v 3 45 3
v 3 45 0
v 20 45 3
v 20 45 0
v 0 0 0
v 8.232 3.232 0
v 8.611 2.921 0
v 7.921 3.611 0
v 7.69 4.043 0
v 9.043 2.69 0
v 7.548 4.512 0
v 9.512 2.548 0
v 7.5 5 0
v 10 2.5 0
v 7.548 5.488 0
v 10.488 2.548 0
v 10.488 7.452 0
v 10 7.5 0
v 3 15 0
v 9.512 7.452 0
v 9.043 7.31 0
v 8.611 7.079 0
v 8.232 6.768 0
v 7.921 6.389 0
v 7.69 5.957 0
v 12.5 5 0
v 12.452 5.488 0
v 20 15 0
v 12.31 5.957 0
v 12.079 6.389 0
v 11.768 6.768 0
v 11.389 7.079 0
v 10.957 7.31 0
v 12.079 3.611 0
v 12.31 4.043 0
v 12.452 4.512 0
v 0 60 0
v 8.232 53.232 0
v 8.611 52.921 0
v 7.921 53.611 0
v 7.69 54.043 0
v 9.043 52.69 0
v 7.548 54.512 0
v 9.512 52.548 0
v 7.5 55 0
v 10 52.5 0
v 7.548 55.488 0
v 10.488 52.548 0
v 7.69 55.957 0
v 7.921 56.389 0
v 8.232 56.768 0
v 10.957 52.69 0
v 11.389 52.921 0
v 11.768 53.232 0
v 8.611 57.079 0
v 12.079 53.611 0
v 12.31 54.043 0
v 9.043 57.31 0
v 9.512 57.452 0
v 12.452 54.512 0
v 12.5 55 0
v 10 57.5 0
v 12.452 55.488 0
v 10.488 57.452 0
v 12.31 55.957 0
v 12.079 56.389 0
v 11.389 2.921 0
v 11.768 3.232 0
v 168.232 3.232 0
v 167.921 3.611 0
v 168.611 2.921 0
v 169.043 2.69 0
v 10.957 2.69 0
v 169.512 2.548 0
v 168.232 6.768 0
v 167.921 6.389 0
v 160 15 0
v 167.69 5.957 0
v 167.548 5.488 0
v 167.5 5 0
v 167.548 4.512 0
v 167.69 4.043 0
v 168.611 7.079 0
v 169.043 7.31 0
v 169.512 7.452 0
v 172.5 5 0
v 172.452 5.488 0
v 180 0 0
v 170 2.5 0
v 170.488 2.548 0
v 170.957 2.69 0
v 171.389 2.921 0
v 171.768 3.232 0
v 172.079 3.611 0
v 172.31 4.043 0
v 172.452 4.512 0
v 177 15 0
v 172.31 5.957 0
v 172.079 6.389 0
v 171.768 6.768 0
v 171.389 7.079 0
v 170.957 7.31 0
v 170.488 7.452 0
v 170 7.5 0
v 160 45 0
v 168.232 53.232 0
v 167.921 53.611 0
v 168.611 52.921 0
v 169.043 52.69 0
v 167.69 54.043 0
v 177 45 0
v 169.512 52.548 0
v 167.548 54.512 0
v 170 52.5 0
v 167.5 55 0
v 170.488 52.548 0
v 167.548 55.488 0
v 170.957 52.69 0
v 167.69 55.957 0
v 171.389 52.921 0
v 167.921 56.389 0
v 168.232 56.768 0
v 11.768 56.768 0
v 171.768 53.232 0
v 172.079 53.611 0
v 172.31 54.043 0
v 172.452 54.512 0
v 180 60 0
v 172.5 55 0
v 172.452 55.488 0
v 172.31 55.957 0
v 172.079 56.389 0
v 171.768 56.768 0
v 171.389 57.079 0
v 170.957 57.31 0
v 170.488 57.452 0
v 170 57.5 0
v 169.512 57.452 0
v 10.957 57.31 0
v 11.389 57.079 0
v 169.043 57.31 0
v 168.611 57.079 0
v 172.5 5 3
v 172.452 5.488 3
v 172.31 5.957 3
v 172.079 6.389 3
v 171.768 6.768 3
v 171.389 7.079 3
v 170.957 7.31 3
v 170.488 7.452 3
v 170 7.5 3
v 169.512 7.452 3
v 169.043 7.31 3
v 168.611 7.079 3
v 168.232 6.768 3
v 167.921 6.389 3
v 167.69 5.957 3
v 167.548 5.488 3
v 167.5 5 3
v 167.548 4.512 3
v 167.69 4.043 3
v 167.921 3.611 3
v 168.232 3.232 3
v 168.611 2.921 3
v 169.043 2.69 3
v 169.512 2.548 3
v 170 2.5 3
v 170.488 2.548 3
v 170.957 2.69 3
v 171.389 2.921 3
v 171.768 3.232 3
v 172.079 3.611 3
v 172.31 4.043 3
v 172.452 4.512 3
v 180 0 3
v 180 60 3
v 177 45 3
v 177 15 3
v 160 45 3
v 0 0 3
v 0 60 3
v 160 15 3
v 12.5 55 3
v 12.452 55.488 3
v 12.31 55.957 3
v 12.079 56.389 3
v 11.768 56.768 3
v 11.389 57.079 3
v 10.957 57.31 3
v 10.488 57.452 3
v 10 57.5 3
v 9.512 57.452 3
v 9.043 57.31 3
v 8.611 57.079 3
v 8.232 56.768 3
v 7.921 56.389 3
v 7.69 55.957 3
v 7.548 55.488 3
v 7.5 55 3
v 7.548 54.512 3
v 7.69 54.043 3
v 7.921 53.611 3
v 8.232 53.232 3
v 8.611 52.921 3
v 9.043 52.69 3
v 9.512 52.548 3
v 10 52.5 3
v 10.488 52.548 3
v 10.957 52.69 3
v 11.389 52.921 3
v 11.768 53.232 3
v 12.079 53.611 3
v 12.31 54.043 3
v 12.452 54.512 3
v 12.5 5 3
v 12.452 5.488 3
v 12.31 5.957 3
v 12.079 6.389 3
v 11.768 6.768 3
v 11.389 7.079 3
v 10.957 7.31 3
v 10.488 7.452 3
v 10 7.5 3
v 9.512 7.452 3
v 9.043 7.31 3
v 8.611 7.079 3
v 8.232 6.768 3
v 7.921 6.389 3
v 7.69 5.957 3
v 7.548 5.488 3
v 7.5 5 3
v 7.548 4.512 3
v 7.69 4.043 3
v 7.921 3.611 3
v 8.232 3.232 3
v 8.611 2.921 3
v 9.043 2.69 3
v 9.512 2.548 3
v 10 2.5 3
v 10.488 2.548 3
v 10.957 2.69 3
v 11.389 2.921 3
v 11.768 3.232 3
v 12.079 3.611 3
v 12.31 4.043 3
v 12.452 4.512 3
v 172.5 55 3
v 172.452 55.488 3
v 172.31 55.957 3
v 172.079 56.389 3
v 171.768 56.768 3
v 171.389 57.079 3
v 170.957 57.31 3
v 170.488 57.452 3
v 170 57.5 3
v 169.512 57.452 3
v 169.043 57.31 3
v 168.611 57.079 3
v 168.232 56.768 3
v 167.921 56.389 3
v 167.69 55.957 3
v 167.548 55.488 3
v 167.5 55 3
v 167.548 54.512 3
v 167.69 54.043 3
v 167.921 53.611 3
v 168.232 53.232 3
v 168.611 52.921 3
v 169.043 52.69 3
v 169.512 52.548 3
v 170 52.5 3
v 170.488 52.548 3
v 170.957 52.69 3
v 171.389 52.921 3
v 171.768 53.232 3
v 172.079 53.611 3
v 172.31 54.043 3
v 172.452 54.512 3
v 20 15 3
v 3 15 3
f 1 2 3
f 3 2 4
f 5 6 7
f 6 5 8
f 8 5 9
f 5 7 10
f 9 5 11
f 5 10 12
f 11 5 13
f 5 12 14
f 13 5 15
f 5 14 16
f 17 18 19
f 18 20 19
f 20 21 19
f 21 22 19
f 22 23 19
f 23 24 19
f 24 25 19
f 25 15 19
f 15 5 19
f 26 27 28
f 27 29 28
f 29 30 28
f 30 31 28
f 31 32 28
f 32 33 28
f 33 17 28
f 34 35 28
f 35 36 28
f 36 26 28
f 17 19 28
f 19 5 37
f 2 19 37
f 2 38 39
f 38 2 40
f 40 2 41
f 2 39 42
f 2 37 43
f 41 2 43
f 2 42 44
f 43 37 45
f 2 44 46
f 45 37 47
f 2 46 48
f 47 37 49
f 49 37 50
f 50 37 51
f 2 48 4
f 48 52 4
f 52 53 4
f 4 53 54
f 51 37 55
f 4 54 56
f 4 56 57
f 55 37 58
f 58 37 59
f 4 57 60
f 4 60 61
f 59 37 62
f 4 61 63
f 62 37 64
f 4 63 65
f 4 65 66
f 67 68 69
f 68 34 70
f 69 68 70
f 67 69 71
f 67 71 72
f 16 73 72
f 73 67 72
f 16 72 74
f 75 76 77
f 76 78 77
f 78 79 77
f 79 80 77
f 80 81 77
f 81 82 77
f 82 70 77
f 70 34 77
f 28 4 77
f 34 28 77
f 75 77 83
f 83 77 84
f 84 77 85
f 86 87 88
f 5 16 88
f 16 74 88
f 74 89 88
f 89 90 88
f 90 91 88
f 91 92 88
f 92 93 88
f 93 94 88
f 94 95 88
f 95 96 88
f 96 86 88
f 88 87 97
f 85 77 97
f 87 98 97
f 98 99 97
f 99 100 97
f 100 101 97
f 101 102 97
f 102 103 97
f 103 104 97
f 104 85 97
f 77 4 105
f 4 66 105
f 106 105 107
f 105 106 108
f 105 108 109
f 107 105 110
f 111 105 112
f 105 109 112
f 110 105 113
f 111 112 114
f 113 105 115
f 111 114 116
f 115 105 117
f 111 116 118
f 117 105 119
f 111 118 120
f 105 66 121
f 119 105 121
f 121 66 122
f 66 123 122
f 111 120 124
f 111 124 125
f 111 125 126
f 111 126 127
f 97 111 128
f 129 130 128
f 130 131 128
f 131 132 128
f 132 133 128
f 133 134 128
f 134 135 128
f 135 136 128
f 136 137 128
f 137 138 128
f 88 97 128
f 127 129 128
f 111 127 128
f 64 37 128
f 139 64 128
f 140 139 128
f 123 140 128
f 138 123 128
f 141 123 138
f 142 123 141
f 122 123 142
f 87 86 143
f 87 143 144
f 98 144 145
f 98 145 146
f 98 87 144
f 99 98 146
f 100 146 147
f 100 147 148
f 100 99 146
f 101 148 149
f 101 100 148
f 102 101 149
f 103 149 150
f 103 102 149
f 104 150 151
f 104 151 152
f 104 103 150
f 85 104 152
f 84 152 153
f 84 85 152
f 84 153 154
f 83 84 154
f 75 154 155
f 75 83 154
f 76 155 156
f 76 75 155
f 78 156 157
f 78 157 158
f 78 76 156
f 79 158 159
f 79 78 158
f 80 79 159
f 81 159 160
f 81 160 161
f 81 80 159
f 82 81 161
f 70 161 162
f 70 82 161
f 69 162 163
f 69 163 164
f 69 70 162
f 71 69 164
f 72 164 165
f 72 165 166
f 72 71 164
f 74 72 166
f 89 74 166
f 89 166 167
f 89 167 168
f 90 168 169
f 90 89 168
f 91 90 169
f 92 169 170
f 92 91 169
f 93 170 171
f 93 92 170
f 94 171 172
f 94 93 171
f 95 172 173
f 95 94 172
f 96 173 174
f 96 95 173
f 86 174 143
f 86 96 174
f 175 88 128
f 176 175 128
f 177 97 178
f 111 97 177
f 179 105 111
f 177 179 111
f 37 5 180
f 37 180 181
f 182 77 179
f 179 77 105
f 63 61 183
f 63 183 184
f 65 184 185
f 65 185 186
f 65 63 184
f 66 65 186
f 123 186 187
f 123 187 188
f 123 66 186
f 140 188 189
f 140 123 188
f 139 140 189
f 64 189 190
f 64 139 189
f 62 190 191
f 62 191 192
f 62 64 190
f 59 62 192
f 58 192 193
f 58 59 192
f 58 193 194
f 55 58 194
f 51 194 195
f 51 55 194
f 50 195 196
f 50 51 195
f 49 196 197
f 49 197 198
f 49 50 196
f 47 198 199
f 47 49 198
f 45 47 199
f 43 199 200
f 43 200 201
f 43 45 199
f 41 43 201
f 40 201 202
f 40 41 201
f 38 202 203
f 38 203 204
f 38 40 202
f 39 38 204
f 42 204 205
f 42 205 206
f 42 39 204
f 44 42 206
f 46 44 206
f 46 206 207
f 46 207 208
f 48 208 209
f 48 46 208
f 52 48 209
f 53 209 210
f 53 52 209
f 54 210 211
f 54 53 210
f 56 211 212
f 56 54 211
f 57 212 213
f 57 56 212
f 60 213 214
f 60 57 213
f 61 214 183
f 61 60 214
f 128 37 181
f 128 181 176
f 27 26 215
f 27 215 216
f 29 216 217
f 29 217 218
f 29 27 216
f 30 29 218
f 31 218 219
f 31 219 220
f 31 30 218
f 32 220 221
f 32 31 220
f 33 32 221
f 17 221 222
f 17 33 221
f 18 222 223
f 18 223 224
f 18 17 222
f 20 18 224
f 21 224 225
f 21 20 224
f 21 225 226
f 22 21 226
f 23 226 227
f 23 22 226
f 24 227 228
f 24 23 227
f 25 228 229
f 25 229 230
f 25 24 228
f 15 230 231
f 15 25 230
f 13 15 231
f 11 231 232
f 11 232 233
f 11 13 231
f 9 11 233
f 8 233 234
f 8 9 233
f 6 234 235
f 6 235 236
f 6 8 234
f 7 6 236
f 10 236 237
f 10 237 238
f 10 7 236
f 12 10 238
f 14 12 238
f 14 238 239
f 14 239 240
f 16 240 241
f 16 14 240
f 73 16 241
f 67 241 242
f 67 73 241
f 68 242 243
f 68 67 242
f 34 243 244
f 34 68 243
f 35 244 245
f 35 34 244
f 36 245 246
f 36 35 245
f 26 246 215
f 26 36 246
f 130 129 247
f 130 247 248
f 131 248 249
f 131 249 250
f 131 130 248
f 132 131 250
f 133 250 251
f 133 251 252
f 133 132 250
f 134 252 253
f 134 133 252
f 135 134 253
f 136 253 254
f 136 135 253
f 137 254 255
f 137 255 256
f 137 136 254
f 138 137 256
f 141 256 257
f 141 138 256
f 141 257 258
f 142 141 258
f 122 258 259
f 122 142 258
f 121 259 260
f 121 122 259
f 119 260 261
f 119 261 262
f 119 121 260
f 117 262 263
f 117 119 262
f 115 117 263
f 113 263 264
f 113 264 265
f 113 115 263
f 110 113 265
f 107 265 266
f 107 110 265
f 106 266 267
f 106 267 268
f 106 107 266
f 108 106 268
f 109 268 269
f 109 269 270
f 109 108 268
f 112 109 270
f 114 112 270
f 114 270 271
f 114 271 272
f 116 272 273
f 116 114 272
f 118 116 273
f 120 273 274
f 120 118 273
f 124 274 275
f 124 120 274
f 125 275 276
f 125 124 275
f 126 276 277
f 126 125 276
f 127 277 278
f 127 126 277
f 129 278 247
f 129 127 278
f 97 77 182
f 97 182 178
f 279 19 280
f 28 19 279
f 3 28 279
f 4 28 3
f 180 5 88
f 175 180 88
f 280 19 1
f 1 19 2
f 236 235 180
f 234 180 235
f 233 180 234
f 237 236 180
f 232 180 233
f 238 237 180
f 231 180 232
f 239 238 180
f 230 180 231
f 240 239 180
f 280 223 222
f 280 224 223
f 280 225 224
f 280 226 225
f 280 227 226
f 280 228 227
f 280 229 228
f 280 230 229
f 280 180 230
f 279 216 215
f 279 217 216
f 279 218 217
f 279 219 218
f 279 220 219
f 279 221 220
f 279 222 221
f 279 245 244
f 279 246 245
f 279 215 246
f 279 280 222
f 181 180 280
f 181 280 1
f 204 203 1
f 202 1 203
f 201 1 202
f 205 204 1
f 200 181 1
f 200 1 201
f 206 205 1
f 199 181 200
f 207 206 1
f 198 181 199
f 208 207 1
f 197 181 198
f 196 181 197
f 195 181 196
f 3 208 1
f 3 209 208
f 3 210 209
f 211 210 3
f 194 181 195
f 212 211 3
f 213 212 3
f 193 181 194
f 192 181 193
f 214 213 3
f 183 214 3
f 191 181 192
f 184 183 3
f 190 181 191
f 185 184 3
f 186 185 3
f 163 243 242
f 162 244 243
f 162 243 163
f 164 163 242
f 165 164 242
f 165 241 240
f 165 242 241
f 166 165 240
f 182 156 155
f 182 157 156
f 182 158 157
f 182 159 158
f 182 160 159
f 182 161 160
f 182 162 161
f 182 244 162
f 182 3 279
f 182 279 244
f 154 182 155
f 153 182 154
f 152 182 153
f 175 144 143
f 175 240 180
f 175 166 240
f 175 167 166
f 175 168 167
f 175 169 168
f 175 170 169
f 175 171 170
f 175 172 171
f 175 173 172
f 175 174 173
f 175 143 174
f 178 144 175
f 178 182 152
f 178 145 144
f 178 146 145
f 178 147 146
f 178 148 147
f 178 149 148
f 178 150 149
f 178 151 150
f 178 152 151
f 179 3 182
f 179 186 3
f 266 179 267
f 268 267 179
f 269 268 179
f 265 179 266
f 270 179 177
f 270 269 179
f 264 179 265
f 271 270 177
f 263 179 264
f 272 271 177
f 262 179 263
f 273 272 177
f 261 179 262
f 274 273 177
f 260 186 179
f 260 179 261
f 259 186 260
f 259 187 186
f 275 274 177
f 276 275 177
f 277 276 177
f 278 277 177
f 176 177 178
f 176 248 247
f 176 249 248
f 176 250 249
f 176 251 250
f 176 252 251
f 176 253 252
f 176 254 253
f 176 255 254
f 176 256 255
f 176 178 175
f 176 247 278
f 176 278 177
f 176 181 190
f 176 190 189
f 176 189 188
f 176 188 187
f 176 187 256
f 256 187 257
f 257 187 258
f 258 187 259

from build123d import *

# Parameters (mm, degrees)
SKETCH_W   = 180
SKETCH_H   = 60
SKETCH_R   = 2.5
SKETCH_W_2 = 17
SKETCH_H_2 = 30
PAD_DEPTH  = 3


with BuildPart() as part:
    # Sketch → Pad (new body)
    with BuildSketch(Plane.XY):
        with Locations((90, 30)):
            Rectangle(SKETCH_W, SKETCH_H)
        with Locations((10, 55)):
            Circle(SKETCH_R, mode=Mode.SUBTRACT)
        with Locations((170, 55)):
            Circle(SKETCH_R, mode=Mode.SUBTRACT)
        with Locations((170, 5)):
            Circle(SKETCH_R, mode=Mode.SUBTRACT)
        with Locations((10, 5)):
            Circle(SKETCH_R, mode=Mode.SUBTRACT)
        with Locations((11.5, 30)):
            Rectangle(SKETCH_W_2, SKETCH_H_2, mode=Mode.SUBTRACT)
        with Locations((168.5, 30)):
            Rectangle(SKETCH_W_2, SKETCH_H_2, mode=Mode.SUBTRACT)
    extrude(amount=PAD_DEPTH)


solid = part.part
